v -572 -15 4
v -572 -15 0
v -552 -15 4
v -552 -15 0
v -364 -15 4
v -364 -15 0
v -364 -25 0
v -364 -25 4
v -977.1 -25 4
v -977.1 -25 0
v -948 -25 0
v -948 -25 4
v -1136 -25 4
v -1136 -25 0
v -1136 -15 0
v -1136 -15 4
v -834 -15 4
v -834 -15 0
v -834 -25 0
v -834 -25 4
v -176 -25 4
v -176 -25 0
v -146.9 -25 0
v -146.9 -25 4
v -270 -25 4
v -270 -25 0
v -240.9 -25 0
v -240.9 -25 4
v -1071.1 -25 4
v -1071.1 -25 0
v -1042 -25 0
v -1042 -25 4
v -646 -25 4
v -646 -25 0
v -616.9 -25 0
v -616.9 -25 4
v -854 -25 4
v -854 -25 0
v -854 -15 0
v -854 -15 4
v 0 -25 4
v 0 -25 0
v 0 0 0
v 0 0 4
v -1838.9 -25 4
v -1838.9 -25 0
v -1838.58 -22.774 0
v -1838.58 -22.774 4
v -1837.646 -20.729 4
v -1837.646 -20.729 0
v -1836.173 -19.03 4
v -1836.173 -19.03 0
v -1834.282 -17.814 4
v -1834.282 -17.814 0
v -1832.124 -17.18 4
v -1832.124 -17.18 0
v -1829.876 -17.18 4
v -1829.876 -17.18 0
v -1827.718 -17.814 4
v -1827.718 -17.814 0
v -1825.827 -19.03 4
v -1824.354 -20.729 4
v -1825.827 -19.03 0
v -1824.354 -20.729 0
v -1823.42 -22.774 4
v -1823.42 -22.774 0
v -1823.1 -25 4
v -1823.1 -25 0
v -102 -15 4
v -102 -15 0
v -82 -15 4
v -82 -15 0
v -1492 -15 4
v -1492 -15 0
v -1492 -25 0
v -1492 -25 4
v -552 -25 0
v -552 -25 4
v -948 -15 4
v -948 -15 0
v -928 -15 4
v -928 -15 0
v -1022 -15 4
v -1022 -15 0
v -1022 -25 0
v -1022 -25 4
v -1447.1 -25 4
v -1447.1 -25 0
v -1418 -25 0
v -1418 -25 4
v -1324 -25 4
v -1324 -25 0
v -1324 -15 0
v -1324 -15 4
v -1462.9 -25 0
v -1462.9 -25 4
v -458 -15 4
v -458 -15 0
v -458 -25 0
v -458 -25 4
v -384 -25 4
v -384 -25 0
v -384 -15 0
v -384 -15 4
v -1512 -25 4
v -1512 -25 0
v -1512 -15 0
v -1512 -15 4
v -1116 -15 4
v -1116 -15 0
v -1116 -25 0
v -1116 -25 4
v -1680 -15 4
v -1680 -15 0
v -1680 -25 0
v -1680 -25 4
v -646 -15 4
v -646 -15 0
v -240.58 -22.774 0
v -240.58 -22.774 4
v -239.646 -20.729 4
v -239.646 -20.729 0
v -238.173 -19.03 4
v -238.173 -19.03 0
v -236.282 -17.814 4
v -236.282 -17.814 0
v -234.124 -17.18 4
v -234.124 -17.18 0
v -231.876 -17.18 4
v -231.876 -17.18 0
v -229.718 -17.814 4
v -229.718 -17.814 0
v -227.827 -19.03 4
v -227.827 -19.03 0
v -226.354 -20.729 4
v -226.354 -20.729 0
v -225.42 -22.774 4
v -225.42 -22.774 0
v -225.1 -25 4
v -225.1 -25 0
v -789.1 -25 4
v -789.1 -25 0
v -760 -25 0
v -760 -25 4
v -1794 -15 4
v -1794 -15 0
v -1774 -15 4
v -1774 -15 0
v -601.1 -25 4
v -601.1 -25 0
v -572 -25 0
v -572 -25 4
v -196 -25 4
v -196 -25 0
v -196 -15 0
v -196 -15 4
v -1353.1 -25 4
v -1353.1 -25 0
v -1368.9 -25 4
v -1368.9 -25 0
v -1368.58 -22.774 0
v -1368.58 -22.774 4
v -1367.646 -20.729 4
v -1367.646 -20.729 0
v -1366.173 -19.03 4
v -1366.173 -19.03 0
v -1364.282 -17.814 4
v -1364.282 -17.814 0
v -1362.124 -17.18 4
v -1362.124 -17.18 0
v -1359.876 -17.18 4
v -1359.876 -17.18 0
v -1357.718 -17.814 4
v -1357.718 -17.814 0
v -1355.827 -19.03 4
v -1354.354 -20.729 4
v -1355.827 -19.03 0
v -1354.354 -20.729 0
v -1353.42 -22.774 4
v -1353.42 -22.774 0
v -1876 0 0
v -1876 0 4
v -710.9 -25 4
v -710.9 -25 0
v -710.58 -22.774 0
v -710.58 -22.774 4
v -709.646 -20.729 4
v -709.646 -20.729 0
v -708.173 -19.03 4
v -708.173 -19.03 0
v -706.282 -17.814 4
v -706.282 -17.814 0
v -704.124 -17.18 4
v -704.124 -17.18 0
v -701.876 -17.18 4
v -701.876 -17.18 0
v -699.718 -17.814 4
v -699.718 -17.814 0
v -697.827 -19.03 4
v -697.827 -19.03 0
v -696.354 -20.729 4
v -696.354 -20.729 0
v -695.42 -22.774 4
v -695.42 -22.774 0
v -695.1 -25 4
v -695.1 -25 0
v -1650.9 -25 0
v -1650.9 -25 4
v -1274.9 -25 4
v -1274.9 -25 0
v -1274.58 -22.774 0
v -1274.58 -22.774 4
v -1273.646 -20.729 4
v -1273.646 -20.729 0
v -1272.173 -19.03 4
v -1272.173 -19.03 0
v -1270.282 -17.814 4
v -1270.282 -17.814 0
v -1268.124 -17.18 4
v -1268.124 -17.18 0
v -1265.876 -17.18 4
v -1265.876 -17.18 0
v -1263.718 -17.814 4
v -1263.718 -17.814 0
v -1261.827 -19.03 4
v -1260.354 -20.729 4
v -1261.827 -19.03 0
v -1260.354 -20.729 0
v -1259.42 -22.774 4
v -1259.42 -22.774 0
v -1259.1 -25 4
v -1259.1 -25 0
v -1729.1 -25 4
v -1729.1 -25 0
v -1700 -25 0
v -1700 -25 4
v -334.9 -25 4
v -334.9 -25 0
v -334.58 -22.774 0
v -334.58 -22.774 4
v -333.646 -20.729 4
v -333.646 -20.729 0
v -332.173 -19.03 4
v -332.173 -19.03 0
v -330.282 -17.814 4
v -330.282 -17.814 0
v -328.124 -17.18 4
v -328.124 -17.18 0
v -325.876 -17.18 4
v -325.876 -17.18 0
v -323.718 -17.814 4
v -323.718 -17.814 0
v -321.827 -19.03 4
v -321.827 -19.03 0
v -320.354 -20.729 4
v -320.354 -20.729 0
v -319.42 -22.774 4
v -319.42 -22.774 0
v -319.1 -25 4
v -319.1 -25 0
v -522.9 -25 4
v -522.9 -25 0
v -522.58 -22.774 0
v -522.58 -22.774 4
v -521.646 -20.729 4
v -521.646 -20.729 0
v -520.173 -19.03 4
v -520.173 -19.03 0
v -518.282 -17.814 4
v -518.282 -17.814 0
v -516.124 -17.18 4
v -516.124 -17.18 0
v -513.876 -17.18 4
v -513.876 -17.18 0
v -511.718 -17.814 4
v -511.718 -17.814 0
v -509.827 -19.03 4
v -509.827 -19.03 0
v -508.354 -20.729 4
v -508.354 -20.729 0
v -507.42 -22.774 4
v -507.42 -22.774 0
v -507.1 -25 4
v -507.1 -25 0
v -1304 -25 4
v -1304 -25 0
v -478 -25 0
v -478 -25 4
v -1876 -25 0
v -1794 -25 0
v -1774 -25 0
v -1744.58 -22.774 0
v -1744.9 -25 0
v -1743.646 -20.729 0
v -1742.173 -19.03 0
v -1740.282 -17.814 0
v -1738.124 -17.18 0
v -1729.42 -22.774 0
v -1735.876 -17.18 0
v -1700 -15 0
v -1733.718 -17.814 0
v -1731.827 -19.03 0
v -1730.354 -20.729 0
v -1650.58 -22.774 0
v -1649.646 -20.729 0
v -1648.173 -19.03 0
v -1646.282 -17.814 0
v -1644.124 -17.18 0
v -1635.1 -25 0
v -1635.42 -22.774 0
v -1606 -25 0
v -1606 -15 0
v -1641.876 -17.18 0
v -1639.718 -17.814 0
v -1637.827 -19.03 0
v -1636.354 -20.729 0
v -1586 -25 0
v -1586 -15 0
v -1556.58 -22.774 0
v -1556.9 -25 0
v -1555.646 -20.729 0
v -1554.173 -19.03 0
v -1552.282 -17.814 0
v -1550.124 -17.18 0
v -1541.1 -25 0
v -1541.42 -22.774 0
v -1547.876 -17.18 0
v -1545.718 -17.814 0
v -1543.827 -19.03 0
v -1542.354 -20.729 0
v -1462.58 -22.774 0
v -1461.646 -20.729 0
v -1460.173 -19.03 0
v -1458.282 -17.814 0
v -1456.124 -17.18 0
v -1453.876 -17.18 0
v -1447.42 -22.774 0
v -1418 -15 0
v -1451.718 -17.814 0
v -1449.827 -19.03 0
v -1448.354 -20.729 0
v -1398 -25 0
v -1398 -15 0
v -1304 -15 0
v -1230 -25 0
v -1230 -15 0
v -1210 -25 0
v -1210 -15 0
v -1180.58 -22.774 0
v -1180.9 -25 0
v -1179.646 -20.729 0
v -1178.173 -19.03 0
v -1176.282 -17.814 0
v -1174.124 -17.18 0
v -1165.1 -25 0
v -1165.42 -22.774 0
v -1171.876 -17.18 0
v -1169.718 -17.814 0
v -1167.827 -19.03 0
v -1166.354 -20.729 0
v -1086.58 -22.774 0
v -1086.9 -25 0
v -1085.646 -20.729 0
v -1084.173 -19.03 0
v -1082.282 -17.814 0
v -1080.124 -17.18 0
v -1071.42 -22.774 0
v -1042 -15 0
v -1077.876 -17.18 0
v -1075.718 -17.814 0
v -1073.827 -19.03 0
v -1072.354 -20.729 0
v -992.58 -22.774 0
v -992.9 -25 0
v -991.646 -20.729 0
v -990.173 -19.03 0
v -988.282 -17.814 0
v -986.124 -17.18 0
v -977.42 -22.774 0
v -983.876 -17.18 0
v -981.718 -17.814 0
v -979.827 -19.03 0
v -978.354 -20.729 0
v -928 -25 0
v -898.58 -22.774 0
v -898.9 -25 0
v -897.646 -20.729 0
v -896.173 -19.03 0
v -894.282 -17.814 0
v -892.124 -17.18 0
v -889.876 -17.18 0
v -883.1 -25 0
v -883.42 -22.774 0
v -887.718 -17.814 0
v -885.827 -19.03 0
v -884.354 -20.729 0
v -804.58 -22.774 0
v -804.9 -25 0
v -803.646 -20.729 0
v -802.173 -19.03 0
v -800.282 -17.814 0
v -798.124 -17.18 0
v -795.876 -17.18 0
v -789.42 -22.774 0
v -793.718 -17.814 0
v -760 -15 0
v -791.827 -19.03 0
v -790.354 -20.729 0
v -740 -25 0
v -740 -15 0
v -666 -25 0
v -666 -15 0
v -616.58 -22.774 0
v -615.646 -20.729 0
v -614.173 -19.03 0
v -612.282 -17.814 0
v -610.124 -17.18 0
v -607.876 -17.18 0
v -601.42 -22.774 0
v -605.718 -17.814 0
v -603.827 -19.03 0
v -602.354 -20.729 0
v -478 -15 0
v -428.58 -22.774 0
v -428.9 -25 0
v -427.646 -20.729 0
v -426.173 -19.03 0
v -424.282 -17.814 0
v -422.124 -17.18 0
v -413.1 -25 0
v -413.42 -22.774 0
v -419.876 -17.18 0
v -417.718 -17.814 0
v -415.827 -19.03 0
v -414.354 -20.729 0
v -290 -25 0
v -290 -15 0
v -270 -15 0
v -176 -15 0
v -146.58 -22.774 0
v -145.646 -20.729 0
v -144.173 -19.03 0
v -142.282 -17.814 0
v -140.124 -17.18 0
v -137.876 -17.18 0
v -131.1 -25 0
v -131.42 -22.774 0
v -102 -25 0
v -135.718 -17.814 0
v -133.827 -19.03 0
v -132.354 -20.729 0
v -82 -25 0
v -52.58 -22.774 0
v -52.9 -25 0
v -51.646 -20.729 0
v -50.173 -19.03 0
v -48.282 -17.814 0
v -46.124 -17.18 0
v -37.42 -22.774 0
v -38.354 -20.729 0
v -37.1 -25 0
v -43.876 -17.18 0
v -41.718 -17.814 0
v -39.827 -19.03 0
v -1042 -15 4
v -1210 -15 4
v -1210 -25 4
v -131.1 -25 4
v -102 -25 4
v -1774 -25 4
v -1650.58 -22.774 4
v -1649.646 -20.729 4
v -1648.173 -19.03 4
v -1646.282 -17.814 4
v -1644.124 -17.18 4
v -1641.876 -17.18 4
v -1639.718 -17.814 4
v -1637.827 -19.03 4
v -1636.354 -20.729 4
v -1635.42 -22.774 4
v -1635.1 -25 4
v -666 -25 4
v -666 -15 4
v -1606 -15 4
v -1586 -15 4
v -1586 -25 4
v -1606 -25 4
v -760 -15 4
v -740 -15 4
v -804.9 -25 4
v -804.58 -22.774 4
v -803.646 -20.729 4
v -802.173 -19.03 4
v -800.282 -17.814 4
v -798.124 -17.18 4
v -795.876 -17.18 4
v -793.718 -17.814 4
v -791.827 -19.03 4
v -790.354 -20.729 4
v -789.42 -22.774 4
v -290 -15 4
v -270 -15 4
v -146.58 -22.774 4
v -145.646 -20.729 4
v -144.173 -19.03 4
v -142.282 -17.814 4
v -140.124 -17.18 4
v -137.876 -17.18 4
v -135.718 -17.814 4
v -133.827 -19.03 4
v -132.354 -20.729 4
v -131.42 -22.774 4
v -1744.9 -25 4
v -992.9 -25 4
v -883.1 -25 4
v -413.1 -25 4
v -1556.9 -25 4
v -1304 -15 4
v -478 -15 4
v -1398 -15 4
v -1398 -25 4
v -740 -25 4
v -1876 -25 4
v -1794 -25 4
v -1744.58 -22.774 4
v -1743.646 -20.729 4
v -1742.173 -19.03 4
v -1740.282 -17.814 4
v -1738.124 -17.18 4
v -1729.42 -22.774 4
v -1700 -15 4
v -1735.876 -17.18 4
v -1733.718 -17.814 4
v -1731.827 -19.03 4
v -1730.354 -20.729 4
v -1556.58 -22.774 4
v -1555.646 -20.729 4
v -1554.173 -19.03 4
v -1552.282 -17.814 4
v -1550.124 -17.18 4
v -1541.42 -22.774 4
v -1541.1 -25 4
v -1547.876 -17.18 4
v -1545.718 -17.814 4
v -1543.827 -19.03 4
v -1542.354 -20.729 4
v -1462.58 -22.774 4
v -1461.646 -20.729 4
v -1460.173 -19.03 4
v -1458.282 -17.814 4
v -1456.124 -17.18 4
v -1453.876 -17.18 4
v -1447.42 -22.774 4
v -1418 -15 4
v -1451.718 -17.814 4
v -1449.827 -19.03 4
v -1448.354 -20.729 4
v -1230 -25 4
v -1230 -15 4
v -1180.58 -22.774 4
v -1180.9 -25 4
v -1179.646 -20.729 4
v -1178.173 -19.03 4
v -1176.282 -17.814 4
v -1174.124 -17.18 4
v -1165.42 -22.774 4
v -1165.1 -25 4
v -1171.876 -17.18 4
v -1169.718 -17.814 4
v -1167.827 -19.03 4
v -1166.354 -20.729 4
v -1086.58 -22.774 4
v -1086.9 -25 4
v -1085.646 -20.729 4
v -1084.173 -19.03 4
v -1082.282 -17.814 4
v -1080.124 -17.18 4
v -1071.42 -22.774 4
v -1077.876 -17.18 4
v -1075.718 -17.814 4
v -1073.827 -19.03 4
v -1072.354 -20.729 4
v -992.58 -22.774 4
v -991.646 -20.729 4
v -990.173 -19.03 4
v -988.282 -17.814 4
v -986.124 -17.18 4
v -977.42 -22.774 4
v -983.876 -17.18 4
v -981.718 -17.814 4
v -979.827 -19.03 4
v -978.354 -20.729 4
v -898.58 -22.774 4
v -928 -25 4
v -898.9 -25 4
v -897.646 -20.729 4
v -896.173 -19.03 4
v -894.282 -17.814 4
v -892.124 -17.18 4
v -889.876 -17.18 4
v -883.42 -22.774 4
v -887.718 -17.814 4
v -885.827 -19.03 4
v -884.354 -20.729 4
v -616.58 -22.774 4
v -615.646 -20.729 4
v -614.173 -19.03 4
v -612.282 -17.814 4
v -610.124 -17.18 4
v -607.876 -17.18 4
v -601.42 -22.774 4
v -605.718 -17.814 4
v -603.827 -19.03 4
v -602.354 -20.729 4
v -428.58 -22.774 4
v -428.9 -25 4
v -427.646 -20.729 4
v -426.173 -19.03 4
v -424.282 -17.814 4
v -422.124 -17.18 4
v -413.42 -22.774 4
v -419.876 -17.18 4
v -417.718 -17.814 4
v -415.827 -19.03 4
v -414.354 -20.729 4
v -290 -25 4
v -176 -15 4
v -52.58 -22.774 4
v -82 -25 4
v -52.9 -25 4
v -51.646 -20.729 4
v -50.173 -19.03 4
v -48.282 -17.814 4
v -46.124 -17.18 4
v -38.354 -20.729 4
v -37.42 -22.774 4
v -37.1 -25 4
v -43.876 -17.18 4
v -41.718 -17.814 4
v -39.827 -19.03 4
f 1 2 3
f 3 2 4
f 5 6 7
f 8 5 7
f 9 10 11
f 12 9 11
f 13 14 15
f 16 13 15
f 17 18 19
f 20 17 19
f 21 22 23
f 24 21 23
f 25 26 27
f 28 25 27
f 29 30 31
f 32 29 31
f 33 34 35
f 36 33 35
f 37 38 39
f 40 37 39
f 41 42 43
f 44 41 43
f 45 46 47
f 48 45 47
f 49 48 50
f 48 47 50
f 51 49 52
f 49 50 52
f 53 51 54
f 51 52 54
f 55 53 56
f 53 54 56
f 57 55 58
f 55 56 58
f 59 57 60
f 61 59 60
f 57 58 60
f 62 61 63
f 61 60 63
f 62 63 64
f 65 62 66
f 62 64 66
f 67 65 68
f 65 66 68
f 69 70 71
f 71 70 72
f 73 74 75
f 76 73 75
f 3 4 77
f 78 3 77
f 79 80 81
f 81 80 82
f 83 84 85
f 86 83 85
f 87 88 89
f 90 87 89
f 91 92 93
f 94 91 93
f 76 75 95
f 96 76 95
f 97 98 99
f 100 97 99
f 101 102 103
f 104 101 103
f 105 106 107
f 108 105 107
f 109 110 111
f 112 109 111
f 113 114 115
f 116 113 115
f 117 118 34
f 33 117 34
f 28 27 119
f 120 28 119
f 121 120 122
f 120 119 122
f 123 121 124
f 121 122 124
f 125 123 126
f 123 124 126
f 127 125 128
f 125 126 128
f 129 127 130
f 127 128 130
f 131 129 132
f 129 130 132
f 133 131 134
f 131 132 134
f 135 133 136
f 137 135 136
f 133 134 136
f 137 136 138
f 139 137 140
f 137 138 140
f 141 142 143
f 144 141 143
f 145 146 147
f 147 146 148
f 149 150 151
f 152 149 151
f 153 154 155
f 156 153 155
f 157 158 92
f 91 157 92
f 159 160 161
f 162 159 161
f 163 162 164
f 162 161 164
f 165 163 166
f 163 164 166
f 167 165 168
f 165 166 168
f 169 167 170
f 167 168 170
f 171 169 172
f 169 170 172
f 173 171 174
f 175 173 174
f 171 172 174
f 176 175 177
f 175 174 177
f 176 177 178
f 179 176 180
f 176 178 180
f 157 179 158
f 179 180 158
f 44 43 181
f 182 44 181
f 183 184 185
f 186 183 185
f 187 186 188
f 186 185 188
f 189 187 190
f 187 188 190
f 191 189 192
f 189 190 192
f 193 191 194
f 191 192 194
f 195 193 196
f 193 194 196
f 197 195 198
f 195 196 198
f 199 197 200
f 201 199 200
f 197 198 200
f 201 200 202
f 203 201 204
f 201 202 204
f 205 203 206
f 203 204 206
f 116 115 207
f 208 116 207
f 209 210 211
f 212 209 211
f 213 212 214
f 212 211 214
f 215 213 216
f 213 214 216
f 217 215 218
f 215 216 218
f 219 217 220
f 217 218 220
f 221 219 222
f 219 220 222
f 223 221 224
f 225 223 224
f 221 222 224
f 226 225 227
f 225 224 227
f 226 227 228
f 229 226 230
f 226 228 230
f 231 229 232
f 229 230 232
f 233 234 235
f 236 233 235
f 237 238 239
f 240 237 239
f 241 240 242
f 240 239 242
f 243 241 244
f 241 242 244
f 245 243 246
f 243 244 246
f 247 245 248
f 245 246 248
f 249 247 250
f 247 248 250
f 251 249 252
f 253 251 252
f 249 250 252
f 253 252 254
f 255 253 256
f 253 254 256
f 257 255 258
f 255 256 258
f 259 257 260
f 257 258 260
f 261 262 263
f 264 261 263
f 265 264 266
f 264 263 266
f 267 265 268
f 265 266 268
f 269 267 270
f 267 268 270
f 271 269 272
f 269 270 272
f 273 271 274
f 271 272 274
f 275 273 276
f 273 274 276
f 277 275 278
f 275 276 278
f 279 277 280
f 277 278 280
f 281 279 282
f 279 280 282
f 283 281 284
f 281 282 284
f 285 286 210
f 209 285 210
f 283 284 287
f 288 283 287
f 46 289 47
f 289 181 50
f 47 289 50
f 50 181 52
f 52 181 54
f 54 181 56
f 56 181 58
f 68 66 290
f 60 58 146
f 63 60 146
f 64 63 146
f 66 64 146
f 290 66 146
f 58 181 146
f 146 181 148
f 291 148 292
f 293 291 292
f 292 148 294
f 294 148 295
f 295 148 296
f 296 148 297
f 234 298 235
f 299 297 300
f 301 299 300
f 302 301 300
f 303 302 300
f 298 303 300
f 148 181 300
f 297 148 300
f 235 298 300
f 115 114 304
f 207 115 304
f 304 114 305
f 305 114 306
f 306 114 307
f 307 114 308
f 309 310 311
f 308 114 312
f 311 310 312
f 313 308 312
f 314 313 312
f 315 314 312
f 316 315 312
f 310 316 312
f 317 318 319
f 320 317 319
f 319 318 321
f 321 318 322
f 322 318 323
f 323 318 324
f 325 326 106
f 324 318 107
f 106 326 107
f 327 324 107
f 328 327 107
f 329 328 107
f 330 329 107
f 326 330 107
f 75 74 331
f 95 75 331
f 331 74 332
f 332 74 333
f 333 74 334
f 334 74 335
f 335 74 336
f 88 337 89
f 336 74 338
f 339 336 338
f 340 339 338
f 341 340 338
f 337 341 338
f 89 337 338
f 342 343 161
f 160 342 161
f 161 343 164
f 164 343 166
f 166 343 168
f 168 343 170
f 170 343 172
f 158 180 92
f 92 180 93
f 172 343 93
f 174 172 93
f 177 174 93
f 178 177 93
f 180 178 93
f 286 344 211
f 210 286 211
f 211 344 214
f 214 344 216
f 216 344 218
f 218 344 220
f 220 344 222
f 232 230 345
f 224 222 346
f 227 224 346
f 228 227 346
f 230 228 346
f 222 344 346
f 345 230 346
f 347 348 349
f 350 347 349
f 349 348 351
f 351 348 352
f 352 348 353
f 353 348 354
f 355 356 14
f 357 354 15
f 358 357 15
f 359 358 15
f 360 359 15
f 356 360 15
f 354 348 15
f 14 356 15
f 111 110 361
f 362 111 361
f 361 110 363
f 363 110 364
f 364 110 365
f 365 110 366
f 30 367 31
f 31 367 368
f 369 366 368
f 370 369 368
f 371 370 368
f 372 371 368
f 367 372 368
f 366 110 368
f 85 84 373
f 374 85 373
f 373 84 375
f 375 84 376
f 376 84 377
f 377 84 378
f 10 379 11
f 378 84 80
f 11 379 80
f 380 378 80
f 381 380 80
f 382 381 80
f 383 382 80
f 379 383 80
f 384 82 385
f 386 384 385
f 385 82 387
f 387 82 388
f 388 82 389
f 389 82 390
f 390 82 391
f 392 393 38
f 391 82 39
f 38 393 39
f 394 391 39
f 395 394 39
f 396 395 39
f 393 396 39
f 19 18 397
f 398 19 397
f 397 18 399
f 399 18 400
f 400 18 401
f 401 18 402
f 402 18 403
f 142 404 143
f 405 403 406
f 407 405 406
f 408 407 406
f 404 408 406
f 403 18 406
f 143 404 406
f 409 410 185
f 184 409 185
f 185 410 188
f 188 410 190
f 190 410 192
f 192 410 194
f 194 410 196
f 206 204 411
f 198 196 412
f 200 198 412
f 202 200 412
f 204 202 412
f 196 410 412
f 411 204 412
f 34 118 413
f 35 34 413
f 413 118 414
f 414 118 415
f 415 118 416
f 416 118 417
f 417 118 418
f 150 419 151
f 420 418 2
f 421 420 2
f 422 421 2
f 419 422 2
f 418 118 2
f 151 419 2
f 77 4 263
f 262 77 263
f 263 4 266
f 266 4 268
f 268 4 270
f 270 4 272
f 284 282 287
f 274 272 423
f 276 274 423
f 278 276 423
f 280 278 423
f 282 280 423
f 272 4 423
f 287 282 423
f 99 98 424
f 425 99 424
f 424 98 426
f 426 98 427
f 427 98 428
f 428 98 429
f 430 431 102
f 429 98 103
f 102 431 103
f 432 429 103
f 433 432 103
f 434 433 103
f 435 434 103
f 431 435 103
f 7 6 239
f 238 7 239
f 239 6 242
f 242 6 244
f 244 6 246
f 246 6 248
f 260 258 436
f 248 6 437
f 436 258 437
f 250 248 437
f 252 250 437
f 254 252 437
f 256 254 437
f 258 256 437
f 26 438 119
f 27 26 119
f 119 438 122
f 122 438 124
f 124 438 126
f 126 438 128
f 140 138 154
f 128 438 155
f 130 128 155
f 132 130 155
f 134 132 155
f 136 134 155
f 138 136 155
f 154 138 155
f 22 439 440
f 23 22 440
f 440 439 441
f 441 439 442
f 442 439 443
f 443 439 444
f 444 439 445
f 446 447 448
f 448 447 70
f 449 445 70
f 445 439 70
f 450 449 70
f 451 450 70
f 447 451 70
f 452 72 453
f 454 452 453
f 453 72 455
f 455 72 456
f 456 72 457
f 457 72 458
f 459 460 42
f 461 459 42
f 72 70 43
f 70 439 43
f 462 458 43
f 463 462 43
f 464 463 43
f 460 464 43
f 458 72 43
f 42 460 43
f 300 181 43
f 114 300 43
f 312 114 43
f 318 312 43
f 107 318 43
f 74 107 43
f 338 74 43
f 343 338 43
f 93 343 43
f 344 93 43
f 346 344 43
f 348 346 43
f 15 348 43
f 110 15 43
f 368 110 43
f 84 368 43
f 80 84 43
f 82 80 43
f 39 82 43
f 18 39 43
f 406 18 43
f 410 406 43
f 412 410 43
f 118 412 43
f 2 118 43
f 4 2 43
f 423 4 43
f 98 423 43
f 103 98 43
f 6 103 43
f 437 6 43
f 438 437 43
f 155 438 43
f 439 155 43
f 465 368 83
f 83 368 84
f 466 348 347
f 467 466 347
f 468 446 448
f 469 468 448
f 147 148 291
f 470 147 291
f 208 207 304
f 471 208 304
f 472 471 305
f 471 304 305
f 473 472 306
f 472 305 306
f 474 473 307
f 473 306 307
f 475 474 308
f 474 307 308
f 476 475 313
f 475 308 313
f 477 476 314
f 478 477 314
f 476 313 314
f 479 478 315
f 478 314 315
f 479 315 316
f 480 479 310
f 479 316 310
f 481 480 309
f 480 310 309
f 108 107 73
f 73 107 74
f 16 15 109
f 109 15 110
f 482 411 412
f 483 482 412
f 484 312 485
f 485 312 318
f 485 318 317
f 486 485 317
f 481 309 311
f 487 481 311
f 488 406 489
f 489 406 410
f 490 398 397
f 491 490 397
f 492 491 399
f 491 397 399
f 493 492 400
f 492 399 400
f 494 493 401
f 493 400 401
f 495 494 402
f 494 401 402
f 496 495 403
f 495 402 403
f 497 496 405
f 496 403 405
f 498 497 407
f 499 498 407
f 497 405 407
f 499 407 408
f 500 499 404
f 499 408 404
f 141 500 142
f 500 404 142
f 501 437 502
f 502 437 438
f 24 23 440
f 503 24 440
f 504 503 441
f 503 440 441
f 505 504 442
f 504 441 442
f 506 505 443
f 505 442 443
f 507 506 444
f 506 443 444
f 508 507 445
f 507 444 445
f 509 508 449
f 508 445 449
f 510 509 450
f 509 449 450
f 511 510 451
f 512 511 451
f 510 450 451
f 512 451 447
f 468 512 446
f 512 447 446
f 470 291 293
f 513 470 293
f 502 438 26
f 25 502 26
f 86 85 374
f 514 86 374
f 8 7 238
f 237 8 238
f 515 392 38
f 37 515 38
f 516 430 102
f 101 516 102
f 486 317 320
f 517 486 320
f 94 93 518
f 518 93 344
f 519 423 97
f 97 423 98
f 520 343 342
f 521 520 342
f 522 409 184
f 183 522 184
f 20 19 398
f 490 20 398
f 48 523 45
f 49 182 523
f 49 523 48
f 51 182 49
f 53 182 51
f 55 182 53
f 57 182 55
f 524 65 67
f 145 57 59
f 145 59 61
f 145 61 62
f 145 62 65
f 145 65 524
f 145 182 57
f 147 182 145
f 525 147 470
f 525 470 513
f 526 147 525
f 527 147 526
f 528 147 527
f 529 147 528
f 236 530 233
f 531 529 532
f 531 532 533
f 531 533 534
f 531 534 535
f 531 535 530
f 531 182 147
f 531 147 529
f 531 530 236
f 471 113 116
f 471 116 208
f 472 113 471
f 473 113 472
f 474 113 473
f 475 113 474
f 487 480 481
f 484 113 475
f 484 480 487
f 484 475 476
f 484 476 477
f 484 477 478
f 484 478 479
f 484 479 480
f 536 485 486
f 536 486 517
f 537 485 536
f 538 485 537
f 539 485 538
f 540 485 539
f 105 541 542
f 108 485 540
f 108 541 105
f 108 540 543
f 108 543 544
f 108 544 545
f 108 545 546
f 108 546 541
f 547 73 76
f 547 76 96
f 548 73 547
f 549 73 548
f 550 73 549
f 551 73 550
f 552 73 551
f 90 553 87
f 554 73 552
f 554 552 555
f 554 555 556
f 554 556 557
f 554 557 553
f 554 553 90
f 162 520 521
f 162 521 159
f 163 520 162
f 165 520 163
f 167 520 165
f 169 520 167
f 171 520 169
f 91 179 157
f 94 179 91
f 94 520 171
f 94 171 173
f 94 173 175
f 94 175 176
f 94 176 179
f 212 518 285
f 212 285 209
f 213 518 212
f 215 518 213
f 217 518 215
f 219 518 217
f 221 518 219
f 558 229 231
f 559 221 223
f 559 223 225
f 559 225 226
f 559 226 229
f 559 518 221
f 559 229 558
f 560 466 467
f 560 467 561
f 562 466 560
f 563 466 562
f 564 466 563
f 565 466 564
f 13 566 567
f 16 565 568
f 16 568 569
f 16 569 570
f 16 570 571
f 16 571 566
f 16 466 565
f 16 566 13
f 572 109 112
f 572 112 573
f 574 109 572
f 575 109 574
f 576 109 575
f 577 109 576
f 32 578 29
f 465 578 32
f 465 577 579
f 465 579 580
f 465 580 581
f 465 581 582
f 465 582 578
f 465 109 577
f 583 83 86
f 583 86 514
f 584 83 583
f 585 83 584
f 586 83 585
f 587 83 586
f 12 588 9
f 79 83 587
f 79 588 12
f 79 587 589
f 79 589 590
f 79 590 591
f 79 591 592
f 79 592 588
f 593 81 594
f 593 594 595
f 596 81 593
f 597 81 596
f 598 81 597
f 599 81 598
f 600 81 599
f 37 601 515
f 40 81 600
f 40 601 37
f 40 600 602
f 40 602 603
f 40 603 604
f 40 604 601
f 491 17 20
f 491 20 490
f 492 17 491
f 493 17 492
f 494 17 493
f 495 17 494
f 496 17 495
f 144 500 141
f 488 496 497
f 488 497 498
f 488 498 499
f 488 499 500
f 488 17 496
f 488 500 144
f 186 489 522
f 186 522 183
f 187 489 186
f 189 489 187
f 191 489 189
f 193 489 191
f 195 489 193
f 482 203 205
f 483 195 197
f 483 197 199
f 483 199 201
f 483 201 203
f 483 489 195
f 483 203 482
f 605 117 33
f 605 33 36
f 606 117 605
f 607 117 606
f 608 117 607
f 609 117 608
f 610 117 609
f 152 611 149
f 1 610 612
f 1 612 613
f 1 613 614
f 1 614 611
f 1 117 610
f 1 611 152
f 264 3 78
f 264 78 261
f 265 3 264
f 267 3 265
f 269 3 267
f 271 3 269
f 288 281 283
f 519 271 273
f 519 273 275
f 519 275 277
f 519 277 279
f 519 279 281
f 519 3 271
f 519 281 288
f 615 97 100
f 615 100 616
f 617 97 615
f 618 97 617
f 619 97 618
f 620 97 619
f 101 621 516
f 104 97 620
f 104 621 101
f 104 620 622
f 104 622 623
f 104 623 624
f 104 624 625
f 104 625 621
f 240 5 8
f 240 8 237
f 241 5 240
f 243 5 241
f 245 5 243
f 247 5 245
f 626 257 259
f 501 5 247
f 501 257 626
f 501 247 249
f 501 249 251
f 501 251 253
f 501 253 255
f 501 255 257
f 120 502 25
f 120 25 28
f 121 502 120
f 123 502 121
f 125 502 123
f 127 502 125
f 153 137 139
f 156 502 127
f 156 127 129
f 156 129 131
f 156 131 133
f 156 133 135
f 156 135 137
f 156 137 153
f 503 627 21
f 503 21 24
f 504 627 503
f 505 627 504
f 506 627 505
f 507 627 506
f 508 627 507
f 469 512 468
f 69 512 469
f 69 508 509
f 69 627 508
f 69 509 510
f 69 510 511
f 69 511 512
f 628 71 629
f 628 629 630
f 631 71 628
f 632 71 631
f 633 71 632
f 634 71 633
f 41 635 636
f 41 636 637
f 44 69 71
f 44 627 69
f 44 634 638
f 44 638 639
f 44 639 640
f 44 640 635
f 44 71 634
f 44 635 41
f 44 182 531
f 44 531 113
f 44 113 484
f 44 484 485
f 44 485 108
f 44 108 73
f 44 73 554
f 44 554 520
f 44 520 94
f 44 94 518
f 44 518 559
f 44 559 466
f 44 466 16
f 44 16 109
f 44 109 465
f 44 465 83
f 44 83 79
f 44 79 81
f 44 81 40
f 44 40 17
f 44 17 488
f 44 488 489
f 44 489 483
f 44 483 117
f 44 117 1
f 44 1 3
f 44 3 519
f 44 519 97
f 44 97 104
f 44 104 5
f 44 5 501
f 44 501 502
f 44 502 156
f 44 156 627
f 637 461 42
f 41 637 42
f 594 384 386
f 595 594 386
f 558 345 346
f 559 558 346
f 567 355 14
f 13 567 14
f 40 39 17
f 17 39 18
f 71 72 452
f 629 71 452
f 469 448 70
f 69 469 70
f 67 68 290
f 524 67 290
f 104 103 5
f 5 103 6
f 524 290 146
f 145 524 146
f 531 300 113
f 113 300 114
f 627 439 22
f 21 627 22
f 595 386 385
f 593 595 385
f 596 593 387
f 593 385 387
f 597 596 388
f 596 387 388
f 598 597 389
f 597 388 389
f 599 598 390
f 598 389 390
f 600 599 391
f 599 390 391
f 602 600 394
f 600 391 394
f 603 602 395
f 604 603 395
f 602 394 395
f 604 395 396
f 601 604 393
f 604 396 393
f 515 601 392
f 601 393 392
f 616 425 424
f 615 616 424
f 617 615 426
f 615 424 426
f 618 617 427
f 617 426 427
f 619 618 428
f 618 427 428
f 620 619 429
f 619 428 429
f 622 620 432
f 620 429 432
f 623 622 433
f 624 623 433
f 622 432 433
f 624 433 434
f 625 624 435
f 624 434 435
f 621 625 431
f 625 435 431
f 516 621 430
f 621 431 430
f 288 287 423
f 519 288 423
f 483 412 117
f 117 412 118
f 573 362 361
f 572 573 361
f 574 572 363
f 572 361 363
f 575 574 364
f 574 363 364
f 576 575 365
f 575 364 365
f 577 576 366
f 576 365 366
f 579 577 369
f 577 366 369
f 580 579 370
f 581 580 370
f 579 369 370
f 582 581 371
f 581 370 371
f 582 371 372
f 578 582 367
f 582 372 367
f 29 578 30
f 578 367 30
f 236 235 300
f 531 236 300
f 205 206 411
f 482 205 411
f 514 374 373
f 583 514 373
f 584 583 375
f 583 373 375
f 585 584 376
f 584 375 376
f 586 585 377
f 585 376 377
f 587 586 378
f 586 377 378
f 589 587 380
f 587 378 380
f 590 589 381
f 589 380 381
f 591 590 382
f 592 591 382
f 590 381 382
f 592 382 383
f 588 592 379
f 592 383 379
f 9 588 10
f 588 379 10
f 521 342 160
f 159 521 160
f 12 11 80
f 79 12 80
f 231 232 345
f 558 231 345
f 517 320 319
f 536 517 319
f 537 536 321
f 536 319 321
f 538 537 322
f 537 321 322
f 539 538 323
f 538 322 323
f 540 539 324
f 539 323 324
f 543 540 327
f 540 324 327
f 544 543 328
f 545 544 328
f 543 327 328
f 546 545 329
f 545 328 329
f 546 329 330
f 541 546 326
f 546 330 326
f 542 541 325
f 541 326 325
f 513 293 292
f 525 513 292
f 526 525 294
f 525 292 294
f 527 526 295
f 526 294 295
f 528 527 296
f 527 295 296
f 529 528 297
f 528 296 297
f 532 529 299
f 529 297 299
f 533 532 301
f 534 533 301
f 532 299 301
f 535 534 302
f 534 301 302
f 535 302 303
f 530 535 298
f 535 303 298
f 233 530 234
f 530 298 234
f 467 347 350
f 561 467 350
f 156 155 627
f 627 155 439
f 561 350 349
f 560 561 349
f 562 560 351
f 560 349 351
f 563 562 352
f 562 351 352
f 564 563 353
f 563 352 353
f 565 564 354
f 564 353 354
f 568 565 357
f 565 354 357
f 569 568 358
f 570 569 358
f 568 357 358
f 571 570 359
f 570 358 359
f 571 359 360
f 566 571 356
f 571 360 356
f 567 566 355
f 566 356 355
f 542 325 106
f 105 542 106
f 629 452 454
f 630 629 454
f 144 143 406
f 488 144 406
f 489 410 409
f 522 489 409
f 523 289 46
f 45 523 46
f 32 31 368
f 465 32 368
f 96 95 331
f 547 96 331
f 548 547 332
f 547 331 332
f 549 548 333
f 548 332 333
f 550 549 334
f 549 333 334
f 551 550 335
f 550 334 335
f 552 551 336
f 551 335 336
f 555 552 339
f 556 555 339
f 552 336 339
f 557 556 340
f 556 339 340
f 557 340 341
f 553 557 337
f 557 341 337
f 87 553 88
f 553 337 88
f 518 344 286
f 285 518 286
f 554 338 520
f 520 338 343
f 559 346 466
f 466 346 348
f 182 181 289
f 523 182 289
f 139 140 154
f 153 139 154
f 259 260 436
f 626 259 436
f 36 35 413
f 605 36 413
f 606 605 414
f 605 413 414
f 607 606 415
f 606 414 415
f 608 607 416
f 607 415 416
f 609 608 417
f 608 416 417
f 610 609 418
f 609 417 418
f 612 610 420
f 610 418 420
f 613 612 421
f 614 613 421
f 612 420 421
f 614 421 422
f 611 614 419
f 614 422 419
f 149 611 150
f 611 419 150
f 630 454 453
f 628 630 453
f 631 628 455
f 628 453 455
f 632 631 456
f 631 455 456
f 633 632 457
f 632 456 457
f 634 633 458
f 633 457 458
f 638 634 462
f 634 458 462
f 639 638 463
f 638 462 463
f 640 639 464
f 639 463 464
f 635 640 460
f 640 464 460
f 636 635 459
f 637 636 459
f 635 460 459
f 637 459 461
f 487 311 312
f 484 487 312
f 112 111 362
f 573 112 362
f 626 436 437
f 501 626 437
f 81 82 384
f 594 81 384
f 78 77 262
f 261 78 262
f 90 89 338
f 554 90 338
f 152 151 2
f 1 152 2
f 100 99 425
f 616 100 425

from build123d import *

# Parameters (mm, degrees)
BOSS_EXTRUDE1_DEPTH = 4


with BuildPart() as part:
    # Sketch1 → Boss-Extrude1 (new body)
    with BuildSketch(Plane.XY):
        with BuildLine():
            Line((0, 0), (-131.1, 0))
            Line((-131.1, 0), (-1876, 0))
            Line((-1876, 0), (-1876, -25))
            Line((-1876, -25), (-1868, -25))
            Line((-1868, -25), (-1838.9, -25))
            ThreePointArc((-1838.9, -25), (-1831, -17.1), (-1823.1, -25))
            Line((-1823.1, -25), (-1794, -25))
            Line((-1794, -25), (-1794, -15))
            Line((-1794, -15), (-1774, -15))
            Line((-1774, -15), (-1774, -25))
            Line((-1774, -25), (-1744.9, -25))
            ThreePointArc((-1744.9, -25), (-1737, -17.1), (-1729.1, -25))
            Line((-1729.1, -25), (-1700, -25))
            Line((-1700, -25), (-1700, -15))
            Line((-1700, -15), (-1680, -15))
            Line((-1680, -15), (-1680, -25))
            Line((-1680, -25), (-1650.9, -25))
            ThreePointArc((-1650.9, -25), (-1643, -17.1), (-1635.1, -25))
            Line((-1635.1, -25), (-1606, -25))
            Line((-1606, -25), (-1606, -15))
            Line((-1606, -15), (-1586, -15))
            Line((-1586, -15), (-1586, -25))
            Line((-1586, -25), (-1556.9, -25))
            ThreePointArc((-1556.9, -25), (-1549, -17.1), (-1541.1, -25))
            Line((-1541.1, -25), (-1512, -25))
            Line((-1512, -25), (-1512, -15))
            Line((-1512, -15), (-1492, -15))
            Line((-1492, -15), (-1492, -25))
            Line((-1492, -25), (-1462.9, -25))
            ThreePointArc((-1462.9, -25), (-1455, -17.1), (-1447.1, -25))
            Line((-1447.1, -25), (-1418, -25))
            Line((-1418, -25), (-1418, -15))
            Line((-1418, -15), (-1398, -15))
            Line((-1398, -15), (-1398, -25))
            Line((-1398, -25), (-1368.9, -25))
            ThreePointArc((-1368.9, -25), (-1361, -17.1), (-1353.1, -25))
            Line((-1353.1, -25), (-1324, -25))
            Line((-1324, -25), (-1324, -15))
            Line((-1324, -15), (-1304, -15))
            Line((-1304, -15), (-1304, -25))
            Line((-1304, -25), (-1274.9, -25))
            ThreePointArc((-1274.9, -25), (-1267, -17.1), (-1259.1, -25))
            Line((-1259.1, -25), (-1230, -25))
            Line((-1230, -25), (-1230, -15))
            Line((-1230, -15), (-1210, -15))
            Line((-1210, -15), (-1210, -25))
            Line((-1210, -25), (-1180.9, -25))
            ThreePointArc((-1180.9, -25), (-1173, -17.1), (-1165.1, -25))
            Line((-1165.1, -25), (-1136, -25))
            Line((-1136, -25), (-1136, -15))
            Line((-1136, -15), (-1116, -15))
            Line((-1116, -15), (-1116, -25))
            Line((-1116, -25), (-1086.9, -25))
            ThreePointArc((-1086.9, -25), (-1079, -17.1), (-1071.1, -25))
            Line((-1071.1, -25), (-1042, -25))
            Line((-1042, -25), (-1042, -15))
            Line((-1042, -15), (-1022, -15))
            Line((-1022, -15), (-1022, -25))
            Line((-1022, -25), (-992.9, -25))
            ThreePointArc((-992.9, -25), (-985, -17.1), (-977.1, -25))
            Line((-977.1, -25), (-948, -25))
            Line((-948, -25), (-948, -15))
            Line((-948, -15), (-928, -15))
            Line((-928, -15), (-928, -25))
            Line((-928, -25), (-898.9, -25))
            ThreePointArc((-898.9, -25), (-891, -17.1), (-883.1, -25))
            Line((-883.1, -25), (-854, -25))
            Line((-854, -25), (-854, -15))
            Line((-854, -15), (-834, -15))
            Line((-834, -15), (-834, -25))
            Line((-834, -25), (-804.9, -25))
            ThreePointArc((-804.9, -25), (-797, -17.1), (-789.1, -25))
            Line((-789.1, -25), (-760, -25))
            Line((-760, -25), (-760, -15))
            Line((-760, -15), (-740, -15))
            Line((-740, -15), (-740, -25))
            Line((-740, -25), (-710.9, -25))
            ThreePointArc((-710.9, -25), (-703, -17.1), (-695.1, -25))
            Line((-695.1, -25), (-666, -25))
            Line((-666, -25), (-666, -15))
            Line((-666, -15), (-646, -15))
            Line((-646, -15), (-646, -25))
            Line((-646, -25), (-616.9, -25))
            ThreePointArc((-616.9, -25), (-609, -17.1), (-601.1, -25))
            Line((-601.1, -25), (-572, -25))
            Line((-572, -25), (-572, -15))
            Line((-572, -15), (-552, -15))
            Line((-552, -15), (-552, -25))
            Line((-552, -25), (-522.9, -25))
            ThreePointArc((-522.9, -25), (-515, -17.1), (-507.1, -25))
            Line((-507.1, -25), (-478, -25))
            Line((-478, -25), (-478, -15))
            Line((-478, -15), (-458, -15))
            Line((-458, -15), (-458, -25))
            Line((-458, -25), (-428.9, -25))
            ThreePointArc((-428.9, -25), (-421, -17.1), (-413.1, -25))
            Line((-413.1, -25), (-384, -25))
            Line((-384, -25), (-384, -15))
            Line((-384, -15), (-364, -15))
            Line((-364, -15), (-364, -25))
            Line((-364, -25), (-334.9, -25))
            ThreePointArc((-334.9, -25), (-327, -17.1), (-319.1, -25))
            Line((-319.1, -25), (-290, -25))
            Line((-290, -25), (-290, -15))
            Line((-290, -15), (-270, -15))
            Line((-270, -15), (-270, -25))
            Line((-270, -25), (-240.9, -25))
            ThreePointArc((-240.9, -25), (-233, -17.1), (-225.1, -25))
            Line((-225.1, -25), (-196, -25))
            Line((-196, -25), (-196, -15))
            Line((-196, -15), (-176, -15))
            Line((-176, -15), (-176, -25))
            Line((-176, -25), (-146.9, -25))
            ThreePointArc((-146.9, -25), (-139, -17.1), (-131.1, -25))
            Line((-131.1, -25), (-102, -25))
            Line((-102, -25), (-102, -15))
            Line((-102, -15), (-82, -15))
            Line((-82, -15), (-82, -25))
            Line((-82, -25), (-52.9, -25))
            ThreePointArc((-52.9, -25), (-45, -17.1), (-37.1, -25))
            Line((-37.1, -25), (0, -25))
            Line((0, -25), (0, 0))
        make_face()
    extrude(amount=BOSS_EXTRUDE1_DEPTH)


solid = part.part
